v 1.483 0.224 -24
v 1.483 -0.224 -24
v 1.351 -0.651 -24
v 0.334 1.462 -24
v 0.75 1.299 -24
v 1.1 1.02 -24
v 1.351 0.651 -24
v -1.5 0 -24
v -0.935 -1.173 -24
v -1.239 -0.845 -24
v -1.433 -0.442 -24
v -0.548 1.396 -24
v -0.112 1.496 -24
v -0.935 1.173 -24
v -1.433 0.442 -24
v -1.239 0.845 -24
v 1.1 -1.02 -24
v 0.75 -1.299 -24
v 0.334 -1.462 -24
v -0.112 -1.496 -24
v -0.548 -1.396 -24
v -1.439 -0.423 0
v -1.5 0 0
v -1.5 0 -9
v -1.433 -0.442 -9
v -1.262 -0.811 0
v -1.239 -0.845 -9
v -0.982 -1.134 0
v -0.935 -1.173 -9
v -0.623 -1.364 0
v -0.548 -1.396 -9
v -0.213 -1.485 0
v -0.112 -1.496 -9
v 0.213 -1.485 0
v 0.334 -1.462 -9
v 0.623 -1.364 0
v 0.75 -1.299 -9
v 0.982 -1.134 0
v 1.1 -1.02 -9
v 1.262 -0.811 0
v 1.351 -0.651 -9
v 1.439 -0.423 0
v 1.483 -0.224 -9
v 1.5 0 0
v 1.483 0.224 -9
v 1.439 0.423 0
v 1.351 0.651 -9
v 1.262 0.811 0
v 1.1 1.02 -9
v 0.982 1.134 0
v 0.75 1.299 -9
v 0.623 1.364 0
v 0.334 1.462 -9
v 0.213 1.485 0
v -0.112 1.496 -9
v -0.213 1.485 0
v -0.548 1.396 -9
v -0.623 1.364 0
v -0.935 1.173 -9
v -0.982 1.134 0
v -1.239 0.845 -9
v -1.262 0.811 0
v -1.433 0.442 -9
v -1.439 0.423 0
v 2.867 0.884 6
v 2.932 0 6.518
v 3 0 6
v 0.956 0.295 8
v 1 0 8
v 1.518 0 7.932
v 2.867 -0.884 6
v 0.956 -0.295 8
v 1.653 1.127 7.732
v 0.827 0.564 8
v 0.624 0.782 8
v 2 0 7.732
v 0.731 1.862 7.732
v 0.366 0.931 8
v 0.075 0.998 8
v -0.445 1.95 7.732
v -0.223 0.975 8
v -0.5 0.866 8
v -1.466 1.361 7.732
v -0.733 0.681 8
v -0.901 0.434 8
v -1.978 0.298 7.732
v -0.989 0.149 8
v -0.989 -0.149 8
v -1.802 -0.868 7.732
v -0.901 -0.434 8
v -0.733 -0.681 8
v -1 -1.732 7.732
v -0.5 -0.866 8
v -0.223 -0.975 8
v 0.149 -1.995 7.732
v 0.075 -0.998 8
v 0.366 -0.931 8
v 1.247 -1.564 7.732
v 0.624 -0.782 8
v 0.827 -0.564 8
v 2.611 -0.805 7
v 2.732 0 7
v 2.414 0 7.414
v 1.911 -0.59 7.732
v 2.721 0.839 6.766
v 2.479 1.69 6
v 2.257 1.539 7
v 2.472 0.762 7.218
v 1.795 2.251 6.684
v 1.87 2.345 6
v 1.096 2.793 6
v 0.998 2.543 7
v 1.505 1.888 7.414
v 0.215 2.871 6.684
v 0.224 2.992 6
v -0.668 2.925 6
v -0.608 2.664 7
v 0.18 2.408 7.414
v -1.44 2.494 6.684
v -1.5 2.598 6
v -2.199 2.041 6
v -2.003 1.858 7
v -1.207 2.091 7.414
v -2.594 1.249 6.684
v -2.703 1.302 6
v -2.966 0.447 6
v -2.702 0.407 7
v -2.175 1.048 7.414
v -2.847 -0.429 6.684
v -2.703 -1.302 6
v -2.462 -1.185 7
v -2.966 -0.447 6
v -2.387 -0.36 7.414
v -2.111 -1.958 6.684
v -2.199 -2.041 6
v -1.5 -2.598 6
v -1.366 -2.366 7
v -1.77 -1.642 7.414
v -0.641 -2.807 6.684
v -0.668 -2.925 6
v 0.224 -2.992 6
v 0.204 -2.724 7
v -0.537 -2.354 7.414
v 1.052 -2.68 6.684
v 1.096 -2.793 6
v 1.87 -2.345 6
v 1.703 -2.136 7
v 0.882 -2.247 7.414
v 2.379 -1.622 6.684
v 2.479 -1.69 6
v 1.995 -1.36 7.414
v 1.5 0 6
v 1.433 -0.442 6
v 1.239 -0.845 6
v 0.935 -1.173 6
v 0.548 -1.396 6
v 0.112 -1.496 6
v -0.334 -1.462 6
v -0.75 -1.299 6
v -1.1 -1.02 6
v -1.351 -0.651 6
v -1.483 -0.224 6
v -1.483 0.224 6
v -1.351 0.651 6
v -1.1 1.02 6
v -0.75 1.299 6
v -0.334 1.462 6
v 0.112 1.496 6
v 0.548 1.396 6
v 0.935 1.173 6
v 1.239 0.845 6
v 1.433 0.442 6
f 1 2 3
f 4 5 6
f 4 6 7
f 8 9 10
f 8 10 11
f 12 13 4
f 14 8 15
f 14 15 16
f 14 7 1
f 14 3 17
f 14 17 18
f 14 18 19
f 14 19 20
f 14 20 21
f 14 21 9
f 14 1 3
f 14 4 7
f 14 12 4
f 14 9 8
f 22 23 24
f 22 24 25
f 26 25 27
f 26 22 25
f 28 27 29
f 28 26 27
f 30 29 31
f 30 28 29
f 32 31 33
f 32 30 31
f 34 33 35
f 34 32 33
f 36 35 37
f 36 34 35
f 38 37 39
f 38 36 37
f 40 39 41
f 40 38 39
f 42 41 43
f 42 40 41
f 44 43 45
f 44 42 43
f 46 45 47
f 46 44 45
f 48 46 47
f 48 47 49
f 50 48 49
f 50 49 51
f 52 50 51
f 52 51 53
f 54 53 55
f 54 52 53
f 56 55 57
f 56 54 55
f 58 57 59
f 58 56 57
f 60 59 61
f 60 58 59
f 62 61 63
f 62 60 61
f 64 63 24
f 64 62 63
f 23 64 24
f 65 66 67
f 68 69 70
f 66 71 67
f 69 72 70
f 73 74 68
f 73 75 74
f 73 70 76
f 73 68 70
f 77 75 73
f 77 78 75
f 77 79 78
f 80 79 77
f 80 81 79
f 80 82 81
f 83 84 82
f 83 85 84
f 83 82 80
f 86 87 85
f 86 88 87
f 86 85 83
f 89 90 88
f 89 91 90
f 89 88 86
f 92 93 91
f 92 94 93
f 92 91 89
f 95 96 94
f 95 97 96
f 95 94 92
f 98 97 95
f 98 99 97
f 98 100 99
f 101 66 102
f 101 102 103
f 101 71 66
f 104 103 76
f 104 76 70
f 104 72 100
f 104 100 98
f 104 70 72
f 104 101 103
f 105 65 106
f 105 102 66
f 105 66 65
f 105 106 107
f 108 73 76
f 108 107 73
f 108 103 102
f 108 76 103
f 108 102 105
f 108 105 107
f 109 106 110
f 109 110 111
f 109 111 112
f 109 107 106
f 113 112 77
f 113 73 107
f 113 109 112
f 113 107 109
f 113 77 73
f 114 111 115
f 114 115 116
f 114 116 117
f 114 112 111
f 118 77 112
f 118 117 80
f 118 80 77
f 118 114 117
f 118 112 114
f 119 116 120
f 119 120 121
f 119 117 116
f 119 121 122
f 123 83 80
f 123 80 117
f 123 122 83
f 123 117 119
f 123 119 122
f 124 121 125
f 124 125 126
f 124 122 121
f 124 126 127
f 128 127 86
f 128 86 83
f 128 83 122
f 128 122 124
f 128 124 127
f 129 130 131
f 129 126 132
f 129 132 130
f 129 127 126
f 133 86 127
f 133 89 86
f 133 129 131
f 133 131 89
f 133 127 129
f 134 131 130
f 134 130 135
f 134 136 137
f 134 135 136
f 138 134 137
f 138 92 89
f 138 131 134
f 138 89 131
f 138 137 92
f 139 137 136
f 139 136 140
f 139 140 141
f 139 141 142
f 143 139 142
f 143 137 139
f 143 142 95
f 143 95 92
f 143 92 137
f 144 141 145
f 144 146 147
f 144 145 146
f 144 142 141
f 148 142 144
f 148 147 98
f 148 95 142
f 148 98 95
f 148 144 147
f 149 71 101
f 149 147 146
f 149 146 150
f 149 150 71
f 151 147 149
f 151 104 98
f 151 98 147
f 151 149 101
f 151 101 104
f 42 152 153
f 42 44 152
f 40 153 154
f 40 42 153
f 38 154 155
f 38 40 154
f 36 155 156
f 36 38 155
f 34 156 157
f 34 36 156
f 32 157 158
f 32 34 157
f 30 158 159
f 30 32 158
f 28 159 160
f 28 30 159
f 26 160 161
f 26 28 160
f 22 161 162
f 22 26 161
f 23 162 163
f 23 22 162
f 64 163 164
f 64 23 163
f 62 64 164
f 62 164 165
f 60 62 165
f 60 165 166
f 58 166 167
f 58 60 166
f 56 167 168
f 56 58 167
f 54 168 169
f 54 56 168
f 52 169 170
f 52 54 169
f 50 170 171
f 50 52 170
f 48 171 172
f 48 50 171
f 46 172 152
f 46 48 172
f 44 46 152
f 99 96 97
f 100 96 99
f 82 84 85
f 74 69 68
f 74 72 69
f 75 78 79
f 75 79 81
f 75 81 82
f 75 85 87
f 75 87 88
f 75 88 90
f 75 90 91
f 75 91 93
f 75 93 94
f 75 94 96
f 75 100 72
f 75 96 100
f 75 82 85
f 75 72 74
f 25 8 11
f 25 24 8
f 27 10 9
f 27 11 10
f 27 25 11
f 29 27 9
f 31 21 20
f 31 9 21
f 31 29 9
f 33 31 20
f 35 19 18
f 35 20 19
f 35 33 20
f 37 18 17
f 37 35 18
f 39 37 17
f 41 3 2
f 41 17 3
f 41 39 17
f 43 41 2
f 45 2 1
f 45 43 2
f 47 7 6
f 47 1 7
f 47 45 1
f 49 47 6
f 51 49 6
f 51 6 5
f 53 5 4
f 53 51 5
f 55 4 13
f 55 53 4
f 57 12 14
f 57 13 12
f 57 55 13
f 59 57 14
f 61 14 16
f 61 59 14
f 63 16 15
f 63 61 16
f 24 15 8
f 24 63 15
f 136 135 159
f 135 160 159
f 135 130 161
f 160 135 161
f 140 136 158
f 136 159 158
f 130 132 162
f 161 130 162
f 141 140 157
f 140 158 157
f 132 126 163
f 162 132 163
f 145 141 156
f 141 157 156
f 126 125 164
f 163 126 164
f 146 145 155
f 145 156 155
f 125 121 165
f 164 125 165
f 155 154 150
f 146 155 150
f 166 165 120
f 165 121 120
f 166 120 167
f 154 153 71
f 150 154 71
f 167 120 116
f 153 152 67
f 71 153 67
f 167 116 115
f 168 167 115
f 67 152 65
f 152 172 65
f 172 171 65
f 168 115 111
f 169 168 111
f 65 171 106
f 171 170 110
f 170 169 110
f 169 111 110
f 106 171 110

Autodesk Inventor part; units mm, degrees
ref_plane "YZ Plane" through (0, 0, 0) normal (1, 0, 0) x (0, 1, 0)
ref_plane "XZ Plane" through (0, 0, 0) normal (0, 1, 0) x (-1, 0, 0)
ref_plane "XY Plane" through (0, 0, 0) normal (0, 0, 1) x (1, 0, 0)
sketch "スケッチ1" plane through (0, 0, 0) normal (0, 0, 1) x (1, 0, 0)
  circle A0 centre (0, 0) radius 1.5
  dimension "d0" = 3
extrude "押し出し1" add sketch "スケッチ1" along normal blind 6
sketch "スケッチ2" plane through (0, 0, 6) normal (0, 0, 1) x (1, 0, 0)
  circle A0 centre (0, 0) radius 1.5 projected
  circle A1 centre (0, 0) radius 3
  dimension "d3" = 6
extrude "押し出し2" add sketch "スケッチ2" along normal blind 2 contours A0 | A1
fillet "フィレット1" radius 2 1 edges at (-3, 0, 8)
thread "ねじ1" size "M3x0.5" class "6g" standard "ANSI Metric M Profile" full length
sketch "スケッチ3" plane through (0, 0, 0) normal (0, 0, -1) x (-1, 0, 0)
  circle A0 centre (0, 0) radius 1.5 projected
extrude "押し出し3" add sketch "スケッチ3" along normal blind 9
sketch "スケッチ4" plane through (0, 0, -9) normal (0, 0, -1) x (-1, 0, 0)
  circle A0 centre (0, 0) radius 1.5 projected
extrude "押し出し4" add sketch "スケッチ4" along normal blind 15
properties part number "SB　30mmなべネジ" material "Steel, Mild"
